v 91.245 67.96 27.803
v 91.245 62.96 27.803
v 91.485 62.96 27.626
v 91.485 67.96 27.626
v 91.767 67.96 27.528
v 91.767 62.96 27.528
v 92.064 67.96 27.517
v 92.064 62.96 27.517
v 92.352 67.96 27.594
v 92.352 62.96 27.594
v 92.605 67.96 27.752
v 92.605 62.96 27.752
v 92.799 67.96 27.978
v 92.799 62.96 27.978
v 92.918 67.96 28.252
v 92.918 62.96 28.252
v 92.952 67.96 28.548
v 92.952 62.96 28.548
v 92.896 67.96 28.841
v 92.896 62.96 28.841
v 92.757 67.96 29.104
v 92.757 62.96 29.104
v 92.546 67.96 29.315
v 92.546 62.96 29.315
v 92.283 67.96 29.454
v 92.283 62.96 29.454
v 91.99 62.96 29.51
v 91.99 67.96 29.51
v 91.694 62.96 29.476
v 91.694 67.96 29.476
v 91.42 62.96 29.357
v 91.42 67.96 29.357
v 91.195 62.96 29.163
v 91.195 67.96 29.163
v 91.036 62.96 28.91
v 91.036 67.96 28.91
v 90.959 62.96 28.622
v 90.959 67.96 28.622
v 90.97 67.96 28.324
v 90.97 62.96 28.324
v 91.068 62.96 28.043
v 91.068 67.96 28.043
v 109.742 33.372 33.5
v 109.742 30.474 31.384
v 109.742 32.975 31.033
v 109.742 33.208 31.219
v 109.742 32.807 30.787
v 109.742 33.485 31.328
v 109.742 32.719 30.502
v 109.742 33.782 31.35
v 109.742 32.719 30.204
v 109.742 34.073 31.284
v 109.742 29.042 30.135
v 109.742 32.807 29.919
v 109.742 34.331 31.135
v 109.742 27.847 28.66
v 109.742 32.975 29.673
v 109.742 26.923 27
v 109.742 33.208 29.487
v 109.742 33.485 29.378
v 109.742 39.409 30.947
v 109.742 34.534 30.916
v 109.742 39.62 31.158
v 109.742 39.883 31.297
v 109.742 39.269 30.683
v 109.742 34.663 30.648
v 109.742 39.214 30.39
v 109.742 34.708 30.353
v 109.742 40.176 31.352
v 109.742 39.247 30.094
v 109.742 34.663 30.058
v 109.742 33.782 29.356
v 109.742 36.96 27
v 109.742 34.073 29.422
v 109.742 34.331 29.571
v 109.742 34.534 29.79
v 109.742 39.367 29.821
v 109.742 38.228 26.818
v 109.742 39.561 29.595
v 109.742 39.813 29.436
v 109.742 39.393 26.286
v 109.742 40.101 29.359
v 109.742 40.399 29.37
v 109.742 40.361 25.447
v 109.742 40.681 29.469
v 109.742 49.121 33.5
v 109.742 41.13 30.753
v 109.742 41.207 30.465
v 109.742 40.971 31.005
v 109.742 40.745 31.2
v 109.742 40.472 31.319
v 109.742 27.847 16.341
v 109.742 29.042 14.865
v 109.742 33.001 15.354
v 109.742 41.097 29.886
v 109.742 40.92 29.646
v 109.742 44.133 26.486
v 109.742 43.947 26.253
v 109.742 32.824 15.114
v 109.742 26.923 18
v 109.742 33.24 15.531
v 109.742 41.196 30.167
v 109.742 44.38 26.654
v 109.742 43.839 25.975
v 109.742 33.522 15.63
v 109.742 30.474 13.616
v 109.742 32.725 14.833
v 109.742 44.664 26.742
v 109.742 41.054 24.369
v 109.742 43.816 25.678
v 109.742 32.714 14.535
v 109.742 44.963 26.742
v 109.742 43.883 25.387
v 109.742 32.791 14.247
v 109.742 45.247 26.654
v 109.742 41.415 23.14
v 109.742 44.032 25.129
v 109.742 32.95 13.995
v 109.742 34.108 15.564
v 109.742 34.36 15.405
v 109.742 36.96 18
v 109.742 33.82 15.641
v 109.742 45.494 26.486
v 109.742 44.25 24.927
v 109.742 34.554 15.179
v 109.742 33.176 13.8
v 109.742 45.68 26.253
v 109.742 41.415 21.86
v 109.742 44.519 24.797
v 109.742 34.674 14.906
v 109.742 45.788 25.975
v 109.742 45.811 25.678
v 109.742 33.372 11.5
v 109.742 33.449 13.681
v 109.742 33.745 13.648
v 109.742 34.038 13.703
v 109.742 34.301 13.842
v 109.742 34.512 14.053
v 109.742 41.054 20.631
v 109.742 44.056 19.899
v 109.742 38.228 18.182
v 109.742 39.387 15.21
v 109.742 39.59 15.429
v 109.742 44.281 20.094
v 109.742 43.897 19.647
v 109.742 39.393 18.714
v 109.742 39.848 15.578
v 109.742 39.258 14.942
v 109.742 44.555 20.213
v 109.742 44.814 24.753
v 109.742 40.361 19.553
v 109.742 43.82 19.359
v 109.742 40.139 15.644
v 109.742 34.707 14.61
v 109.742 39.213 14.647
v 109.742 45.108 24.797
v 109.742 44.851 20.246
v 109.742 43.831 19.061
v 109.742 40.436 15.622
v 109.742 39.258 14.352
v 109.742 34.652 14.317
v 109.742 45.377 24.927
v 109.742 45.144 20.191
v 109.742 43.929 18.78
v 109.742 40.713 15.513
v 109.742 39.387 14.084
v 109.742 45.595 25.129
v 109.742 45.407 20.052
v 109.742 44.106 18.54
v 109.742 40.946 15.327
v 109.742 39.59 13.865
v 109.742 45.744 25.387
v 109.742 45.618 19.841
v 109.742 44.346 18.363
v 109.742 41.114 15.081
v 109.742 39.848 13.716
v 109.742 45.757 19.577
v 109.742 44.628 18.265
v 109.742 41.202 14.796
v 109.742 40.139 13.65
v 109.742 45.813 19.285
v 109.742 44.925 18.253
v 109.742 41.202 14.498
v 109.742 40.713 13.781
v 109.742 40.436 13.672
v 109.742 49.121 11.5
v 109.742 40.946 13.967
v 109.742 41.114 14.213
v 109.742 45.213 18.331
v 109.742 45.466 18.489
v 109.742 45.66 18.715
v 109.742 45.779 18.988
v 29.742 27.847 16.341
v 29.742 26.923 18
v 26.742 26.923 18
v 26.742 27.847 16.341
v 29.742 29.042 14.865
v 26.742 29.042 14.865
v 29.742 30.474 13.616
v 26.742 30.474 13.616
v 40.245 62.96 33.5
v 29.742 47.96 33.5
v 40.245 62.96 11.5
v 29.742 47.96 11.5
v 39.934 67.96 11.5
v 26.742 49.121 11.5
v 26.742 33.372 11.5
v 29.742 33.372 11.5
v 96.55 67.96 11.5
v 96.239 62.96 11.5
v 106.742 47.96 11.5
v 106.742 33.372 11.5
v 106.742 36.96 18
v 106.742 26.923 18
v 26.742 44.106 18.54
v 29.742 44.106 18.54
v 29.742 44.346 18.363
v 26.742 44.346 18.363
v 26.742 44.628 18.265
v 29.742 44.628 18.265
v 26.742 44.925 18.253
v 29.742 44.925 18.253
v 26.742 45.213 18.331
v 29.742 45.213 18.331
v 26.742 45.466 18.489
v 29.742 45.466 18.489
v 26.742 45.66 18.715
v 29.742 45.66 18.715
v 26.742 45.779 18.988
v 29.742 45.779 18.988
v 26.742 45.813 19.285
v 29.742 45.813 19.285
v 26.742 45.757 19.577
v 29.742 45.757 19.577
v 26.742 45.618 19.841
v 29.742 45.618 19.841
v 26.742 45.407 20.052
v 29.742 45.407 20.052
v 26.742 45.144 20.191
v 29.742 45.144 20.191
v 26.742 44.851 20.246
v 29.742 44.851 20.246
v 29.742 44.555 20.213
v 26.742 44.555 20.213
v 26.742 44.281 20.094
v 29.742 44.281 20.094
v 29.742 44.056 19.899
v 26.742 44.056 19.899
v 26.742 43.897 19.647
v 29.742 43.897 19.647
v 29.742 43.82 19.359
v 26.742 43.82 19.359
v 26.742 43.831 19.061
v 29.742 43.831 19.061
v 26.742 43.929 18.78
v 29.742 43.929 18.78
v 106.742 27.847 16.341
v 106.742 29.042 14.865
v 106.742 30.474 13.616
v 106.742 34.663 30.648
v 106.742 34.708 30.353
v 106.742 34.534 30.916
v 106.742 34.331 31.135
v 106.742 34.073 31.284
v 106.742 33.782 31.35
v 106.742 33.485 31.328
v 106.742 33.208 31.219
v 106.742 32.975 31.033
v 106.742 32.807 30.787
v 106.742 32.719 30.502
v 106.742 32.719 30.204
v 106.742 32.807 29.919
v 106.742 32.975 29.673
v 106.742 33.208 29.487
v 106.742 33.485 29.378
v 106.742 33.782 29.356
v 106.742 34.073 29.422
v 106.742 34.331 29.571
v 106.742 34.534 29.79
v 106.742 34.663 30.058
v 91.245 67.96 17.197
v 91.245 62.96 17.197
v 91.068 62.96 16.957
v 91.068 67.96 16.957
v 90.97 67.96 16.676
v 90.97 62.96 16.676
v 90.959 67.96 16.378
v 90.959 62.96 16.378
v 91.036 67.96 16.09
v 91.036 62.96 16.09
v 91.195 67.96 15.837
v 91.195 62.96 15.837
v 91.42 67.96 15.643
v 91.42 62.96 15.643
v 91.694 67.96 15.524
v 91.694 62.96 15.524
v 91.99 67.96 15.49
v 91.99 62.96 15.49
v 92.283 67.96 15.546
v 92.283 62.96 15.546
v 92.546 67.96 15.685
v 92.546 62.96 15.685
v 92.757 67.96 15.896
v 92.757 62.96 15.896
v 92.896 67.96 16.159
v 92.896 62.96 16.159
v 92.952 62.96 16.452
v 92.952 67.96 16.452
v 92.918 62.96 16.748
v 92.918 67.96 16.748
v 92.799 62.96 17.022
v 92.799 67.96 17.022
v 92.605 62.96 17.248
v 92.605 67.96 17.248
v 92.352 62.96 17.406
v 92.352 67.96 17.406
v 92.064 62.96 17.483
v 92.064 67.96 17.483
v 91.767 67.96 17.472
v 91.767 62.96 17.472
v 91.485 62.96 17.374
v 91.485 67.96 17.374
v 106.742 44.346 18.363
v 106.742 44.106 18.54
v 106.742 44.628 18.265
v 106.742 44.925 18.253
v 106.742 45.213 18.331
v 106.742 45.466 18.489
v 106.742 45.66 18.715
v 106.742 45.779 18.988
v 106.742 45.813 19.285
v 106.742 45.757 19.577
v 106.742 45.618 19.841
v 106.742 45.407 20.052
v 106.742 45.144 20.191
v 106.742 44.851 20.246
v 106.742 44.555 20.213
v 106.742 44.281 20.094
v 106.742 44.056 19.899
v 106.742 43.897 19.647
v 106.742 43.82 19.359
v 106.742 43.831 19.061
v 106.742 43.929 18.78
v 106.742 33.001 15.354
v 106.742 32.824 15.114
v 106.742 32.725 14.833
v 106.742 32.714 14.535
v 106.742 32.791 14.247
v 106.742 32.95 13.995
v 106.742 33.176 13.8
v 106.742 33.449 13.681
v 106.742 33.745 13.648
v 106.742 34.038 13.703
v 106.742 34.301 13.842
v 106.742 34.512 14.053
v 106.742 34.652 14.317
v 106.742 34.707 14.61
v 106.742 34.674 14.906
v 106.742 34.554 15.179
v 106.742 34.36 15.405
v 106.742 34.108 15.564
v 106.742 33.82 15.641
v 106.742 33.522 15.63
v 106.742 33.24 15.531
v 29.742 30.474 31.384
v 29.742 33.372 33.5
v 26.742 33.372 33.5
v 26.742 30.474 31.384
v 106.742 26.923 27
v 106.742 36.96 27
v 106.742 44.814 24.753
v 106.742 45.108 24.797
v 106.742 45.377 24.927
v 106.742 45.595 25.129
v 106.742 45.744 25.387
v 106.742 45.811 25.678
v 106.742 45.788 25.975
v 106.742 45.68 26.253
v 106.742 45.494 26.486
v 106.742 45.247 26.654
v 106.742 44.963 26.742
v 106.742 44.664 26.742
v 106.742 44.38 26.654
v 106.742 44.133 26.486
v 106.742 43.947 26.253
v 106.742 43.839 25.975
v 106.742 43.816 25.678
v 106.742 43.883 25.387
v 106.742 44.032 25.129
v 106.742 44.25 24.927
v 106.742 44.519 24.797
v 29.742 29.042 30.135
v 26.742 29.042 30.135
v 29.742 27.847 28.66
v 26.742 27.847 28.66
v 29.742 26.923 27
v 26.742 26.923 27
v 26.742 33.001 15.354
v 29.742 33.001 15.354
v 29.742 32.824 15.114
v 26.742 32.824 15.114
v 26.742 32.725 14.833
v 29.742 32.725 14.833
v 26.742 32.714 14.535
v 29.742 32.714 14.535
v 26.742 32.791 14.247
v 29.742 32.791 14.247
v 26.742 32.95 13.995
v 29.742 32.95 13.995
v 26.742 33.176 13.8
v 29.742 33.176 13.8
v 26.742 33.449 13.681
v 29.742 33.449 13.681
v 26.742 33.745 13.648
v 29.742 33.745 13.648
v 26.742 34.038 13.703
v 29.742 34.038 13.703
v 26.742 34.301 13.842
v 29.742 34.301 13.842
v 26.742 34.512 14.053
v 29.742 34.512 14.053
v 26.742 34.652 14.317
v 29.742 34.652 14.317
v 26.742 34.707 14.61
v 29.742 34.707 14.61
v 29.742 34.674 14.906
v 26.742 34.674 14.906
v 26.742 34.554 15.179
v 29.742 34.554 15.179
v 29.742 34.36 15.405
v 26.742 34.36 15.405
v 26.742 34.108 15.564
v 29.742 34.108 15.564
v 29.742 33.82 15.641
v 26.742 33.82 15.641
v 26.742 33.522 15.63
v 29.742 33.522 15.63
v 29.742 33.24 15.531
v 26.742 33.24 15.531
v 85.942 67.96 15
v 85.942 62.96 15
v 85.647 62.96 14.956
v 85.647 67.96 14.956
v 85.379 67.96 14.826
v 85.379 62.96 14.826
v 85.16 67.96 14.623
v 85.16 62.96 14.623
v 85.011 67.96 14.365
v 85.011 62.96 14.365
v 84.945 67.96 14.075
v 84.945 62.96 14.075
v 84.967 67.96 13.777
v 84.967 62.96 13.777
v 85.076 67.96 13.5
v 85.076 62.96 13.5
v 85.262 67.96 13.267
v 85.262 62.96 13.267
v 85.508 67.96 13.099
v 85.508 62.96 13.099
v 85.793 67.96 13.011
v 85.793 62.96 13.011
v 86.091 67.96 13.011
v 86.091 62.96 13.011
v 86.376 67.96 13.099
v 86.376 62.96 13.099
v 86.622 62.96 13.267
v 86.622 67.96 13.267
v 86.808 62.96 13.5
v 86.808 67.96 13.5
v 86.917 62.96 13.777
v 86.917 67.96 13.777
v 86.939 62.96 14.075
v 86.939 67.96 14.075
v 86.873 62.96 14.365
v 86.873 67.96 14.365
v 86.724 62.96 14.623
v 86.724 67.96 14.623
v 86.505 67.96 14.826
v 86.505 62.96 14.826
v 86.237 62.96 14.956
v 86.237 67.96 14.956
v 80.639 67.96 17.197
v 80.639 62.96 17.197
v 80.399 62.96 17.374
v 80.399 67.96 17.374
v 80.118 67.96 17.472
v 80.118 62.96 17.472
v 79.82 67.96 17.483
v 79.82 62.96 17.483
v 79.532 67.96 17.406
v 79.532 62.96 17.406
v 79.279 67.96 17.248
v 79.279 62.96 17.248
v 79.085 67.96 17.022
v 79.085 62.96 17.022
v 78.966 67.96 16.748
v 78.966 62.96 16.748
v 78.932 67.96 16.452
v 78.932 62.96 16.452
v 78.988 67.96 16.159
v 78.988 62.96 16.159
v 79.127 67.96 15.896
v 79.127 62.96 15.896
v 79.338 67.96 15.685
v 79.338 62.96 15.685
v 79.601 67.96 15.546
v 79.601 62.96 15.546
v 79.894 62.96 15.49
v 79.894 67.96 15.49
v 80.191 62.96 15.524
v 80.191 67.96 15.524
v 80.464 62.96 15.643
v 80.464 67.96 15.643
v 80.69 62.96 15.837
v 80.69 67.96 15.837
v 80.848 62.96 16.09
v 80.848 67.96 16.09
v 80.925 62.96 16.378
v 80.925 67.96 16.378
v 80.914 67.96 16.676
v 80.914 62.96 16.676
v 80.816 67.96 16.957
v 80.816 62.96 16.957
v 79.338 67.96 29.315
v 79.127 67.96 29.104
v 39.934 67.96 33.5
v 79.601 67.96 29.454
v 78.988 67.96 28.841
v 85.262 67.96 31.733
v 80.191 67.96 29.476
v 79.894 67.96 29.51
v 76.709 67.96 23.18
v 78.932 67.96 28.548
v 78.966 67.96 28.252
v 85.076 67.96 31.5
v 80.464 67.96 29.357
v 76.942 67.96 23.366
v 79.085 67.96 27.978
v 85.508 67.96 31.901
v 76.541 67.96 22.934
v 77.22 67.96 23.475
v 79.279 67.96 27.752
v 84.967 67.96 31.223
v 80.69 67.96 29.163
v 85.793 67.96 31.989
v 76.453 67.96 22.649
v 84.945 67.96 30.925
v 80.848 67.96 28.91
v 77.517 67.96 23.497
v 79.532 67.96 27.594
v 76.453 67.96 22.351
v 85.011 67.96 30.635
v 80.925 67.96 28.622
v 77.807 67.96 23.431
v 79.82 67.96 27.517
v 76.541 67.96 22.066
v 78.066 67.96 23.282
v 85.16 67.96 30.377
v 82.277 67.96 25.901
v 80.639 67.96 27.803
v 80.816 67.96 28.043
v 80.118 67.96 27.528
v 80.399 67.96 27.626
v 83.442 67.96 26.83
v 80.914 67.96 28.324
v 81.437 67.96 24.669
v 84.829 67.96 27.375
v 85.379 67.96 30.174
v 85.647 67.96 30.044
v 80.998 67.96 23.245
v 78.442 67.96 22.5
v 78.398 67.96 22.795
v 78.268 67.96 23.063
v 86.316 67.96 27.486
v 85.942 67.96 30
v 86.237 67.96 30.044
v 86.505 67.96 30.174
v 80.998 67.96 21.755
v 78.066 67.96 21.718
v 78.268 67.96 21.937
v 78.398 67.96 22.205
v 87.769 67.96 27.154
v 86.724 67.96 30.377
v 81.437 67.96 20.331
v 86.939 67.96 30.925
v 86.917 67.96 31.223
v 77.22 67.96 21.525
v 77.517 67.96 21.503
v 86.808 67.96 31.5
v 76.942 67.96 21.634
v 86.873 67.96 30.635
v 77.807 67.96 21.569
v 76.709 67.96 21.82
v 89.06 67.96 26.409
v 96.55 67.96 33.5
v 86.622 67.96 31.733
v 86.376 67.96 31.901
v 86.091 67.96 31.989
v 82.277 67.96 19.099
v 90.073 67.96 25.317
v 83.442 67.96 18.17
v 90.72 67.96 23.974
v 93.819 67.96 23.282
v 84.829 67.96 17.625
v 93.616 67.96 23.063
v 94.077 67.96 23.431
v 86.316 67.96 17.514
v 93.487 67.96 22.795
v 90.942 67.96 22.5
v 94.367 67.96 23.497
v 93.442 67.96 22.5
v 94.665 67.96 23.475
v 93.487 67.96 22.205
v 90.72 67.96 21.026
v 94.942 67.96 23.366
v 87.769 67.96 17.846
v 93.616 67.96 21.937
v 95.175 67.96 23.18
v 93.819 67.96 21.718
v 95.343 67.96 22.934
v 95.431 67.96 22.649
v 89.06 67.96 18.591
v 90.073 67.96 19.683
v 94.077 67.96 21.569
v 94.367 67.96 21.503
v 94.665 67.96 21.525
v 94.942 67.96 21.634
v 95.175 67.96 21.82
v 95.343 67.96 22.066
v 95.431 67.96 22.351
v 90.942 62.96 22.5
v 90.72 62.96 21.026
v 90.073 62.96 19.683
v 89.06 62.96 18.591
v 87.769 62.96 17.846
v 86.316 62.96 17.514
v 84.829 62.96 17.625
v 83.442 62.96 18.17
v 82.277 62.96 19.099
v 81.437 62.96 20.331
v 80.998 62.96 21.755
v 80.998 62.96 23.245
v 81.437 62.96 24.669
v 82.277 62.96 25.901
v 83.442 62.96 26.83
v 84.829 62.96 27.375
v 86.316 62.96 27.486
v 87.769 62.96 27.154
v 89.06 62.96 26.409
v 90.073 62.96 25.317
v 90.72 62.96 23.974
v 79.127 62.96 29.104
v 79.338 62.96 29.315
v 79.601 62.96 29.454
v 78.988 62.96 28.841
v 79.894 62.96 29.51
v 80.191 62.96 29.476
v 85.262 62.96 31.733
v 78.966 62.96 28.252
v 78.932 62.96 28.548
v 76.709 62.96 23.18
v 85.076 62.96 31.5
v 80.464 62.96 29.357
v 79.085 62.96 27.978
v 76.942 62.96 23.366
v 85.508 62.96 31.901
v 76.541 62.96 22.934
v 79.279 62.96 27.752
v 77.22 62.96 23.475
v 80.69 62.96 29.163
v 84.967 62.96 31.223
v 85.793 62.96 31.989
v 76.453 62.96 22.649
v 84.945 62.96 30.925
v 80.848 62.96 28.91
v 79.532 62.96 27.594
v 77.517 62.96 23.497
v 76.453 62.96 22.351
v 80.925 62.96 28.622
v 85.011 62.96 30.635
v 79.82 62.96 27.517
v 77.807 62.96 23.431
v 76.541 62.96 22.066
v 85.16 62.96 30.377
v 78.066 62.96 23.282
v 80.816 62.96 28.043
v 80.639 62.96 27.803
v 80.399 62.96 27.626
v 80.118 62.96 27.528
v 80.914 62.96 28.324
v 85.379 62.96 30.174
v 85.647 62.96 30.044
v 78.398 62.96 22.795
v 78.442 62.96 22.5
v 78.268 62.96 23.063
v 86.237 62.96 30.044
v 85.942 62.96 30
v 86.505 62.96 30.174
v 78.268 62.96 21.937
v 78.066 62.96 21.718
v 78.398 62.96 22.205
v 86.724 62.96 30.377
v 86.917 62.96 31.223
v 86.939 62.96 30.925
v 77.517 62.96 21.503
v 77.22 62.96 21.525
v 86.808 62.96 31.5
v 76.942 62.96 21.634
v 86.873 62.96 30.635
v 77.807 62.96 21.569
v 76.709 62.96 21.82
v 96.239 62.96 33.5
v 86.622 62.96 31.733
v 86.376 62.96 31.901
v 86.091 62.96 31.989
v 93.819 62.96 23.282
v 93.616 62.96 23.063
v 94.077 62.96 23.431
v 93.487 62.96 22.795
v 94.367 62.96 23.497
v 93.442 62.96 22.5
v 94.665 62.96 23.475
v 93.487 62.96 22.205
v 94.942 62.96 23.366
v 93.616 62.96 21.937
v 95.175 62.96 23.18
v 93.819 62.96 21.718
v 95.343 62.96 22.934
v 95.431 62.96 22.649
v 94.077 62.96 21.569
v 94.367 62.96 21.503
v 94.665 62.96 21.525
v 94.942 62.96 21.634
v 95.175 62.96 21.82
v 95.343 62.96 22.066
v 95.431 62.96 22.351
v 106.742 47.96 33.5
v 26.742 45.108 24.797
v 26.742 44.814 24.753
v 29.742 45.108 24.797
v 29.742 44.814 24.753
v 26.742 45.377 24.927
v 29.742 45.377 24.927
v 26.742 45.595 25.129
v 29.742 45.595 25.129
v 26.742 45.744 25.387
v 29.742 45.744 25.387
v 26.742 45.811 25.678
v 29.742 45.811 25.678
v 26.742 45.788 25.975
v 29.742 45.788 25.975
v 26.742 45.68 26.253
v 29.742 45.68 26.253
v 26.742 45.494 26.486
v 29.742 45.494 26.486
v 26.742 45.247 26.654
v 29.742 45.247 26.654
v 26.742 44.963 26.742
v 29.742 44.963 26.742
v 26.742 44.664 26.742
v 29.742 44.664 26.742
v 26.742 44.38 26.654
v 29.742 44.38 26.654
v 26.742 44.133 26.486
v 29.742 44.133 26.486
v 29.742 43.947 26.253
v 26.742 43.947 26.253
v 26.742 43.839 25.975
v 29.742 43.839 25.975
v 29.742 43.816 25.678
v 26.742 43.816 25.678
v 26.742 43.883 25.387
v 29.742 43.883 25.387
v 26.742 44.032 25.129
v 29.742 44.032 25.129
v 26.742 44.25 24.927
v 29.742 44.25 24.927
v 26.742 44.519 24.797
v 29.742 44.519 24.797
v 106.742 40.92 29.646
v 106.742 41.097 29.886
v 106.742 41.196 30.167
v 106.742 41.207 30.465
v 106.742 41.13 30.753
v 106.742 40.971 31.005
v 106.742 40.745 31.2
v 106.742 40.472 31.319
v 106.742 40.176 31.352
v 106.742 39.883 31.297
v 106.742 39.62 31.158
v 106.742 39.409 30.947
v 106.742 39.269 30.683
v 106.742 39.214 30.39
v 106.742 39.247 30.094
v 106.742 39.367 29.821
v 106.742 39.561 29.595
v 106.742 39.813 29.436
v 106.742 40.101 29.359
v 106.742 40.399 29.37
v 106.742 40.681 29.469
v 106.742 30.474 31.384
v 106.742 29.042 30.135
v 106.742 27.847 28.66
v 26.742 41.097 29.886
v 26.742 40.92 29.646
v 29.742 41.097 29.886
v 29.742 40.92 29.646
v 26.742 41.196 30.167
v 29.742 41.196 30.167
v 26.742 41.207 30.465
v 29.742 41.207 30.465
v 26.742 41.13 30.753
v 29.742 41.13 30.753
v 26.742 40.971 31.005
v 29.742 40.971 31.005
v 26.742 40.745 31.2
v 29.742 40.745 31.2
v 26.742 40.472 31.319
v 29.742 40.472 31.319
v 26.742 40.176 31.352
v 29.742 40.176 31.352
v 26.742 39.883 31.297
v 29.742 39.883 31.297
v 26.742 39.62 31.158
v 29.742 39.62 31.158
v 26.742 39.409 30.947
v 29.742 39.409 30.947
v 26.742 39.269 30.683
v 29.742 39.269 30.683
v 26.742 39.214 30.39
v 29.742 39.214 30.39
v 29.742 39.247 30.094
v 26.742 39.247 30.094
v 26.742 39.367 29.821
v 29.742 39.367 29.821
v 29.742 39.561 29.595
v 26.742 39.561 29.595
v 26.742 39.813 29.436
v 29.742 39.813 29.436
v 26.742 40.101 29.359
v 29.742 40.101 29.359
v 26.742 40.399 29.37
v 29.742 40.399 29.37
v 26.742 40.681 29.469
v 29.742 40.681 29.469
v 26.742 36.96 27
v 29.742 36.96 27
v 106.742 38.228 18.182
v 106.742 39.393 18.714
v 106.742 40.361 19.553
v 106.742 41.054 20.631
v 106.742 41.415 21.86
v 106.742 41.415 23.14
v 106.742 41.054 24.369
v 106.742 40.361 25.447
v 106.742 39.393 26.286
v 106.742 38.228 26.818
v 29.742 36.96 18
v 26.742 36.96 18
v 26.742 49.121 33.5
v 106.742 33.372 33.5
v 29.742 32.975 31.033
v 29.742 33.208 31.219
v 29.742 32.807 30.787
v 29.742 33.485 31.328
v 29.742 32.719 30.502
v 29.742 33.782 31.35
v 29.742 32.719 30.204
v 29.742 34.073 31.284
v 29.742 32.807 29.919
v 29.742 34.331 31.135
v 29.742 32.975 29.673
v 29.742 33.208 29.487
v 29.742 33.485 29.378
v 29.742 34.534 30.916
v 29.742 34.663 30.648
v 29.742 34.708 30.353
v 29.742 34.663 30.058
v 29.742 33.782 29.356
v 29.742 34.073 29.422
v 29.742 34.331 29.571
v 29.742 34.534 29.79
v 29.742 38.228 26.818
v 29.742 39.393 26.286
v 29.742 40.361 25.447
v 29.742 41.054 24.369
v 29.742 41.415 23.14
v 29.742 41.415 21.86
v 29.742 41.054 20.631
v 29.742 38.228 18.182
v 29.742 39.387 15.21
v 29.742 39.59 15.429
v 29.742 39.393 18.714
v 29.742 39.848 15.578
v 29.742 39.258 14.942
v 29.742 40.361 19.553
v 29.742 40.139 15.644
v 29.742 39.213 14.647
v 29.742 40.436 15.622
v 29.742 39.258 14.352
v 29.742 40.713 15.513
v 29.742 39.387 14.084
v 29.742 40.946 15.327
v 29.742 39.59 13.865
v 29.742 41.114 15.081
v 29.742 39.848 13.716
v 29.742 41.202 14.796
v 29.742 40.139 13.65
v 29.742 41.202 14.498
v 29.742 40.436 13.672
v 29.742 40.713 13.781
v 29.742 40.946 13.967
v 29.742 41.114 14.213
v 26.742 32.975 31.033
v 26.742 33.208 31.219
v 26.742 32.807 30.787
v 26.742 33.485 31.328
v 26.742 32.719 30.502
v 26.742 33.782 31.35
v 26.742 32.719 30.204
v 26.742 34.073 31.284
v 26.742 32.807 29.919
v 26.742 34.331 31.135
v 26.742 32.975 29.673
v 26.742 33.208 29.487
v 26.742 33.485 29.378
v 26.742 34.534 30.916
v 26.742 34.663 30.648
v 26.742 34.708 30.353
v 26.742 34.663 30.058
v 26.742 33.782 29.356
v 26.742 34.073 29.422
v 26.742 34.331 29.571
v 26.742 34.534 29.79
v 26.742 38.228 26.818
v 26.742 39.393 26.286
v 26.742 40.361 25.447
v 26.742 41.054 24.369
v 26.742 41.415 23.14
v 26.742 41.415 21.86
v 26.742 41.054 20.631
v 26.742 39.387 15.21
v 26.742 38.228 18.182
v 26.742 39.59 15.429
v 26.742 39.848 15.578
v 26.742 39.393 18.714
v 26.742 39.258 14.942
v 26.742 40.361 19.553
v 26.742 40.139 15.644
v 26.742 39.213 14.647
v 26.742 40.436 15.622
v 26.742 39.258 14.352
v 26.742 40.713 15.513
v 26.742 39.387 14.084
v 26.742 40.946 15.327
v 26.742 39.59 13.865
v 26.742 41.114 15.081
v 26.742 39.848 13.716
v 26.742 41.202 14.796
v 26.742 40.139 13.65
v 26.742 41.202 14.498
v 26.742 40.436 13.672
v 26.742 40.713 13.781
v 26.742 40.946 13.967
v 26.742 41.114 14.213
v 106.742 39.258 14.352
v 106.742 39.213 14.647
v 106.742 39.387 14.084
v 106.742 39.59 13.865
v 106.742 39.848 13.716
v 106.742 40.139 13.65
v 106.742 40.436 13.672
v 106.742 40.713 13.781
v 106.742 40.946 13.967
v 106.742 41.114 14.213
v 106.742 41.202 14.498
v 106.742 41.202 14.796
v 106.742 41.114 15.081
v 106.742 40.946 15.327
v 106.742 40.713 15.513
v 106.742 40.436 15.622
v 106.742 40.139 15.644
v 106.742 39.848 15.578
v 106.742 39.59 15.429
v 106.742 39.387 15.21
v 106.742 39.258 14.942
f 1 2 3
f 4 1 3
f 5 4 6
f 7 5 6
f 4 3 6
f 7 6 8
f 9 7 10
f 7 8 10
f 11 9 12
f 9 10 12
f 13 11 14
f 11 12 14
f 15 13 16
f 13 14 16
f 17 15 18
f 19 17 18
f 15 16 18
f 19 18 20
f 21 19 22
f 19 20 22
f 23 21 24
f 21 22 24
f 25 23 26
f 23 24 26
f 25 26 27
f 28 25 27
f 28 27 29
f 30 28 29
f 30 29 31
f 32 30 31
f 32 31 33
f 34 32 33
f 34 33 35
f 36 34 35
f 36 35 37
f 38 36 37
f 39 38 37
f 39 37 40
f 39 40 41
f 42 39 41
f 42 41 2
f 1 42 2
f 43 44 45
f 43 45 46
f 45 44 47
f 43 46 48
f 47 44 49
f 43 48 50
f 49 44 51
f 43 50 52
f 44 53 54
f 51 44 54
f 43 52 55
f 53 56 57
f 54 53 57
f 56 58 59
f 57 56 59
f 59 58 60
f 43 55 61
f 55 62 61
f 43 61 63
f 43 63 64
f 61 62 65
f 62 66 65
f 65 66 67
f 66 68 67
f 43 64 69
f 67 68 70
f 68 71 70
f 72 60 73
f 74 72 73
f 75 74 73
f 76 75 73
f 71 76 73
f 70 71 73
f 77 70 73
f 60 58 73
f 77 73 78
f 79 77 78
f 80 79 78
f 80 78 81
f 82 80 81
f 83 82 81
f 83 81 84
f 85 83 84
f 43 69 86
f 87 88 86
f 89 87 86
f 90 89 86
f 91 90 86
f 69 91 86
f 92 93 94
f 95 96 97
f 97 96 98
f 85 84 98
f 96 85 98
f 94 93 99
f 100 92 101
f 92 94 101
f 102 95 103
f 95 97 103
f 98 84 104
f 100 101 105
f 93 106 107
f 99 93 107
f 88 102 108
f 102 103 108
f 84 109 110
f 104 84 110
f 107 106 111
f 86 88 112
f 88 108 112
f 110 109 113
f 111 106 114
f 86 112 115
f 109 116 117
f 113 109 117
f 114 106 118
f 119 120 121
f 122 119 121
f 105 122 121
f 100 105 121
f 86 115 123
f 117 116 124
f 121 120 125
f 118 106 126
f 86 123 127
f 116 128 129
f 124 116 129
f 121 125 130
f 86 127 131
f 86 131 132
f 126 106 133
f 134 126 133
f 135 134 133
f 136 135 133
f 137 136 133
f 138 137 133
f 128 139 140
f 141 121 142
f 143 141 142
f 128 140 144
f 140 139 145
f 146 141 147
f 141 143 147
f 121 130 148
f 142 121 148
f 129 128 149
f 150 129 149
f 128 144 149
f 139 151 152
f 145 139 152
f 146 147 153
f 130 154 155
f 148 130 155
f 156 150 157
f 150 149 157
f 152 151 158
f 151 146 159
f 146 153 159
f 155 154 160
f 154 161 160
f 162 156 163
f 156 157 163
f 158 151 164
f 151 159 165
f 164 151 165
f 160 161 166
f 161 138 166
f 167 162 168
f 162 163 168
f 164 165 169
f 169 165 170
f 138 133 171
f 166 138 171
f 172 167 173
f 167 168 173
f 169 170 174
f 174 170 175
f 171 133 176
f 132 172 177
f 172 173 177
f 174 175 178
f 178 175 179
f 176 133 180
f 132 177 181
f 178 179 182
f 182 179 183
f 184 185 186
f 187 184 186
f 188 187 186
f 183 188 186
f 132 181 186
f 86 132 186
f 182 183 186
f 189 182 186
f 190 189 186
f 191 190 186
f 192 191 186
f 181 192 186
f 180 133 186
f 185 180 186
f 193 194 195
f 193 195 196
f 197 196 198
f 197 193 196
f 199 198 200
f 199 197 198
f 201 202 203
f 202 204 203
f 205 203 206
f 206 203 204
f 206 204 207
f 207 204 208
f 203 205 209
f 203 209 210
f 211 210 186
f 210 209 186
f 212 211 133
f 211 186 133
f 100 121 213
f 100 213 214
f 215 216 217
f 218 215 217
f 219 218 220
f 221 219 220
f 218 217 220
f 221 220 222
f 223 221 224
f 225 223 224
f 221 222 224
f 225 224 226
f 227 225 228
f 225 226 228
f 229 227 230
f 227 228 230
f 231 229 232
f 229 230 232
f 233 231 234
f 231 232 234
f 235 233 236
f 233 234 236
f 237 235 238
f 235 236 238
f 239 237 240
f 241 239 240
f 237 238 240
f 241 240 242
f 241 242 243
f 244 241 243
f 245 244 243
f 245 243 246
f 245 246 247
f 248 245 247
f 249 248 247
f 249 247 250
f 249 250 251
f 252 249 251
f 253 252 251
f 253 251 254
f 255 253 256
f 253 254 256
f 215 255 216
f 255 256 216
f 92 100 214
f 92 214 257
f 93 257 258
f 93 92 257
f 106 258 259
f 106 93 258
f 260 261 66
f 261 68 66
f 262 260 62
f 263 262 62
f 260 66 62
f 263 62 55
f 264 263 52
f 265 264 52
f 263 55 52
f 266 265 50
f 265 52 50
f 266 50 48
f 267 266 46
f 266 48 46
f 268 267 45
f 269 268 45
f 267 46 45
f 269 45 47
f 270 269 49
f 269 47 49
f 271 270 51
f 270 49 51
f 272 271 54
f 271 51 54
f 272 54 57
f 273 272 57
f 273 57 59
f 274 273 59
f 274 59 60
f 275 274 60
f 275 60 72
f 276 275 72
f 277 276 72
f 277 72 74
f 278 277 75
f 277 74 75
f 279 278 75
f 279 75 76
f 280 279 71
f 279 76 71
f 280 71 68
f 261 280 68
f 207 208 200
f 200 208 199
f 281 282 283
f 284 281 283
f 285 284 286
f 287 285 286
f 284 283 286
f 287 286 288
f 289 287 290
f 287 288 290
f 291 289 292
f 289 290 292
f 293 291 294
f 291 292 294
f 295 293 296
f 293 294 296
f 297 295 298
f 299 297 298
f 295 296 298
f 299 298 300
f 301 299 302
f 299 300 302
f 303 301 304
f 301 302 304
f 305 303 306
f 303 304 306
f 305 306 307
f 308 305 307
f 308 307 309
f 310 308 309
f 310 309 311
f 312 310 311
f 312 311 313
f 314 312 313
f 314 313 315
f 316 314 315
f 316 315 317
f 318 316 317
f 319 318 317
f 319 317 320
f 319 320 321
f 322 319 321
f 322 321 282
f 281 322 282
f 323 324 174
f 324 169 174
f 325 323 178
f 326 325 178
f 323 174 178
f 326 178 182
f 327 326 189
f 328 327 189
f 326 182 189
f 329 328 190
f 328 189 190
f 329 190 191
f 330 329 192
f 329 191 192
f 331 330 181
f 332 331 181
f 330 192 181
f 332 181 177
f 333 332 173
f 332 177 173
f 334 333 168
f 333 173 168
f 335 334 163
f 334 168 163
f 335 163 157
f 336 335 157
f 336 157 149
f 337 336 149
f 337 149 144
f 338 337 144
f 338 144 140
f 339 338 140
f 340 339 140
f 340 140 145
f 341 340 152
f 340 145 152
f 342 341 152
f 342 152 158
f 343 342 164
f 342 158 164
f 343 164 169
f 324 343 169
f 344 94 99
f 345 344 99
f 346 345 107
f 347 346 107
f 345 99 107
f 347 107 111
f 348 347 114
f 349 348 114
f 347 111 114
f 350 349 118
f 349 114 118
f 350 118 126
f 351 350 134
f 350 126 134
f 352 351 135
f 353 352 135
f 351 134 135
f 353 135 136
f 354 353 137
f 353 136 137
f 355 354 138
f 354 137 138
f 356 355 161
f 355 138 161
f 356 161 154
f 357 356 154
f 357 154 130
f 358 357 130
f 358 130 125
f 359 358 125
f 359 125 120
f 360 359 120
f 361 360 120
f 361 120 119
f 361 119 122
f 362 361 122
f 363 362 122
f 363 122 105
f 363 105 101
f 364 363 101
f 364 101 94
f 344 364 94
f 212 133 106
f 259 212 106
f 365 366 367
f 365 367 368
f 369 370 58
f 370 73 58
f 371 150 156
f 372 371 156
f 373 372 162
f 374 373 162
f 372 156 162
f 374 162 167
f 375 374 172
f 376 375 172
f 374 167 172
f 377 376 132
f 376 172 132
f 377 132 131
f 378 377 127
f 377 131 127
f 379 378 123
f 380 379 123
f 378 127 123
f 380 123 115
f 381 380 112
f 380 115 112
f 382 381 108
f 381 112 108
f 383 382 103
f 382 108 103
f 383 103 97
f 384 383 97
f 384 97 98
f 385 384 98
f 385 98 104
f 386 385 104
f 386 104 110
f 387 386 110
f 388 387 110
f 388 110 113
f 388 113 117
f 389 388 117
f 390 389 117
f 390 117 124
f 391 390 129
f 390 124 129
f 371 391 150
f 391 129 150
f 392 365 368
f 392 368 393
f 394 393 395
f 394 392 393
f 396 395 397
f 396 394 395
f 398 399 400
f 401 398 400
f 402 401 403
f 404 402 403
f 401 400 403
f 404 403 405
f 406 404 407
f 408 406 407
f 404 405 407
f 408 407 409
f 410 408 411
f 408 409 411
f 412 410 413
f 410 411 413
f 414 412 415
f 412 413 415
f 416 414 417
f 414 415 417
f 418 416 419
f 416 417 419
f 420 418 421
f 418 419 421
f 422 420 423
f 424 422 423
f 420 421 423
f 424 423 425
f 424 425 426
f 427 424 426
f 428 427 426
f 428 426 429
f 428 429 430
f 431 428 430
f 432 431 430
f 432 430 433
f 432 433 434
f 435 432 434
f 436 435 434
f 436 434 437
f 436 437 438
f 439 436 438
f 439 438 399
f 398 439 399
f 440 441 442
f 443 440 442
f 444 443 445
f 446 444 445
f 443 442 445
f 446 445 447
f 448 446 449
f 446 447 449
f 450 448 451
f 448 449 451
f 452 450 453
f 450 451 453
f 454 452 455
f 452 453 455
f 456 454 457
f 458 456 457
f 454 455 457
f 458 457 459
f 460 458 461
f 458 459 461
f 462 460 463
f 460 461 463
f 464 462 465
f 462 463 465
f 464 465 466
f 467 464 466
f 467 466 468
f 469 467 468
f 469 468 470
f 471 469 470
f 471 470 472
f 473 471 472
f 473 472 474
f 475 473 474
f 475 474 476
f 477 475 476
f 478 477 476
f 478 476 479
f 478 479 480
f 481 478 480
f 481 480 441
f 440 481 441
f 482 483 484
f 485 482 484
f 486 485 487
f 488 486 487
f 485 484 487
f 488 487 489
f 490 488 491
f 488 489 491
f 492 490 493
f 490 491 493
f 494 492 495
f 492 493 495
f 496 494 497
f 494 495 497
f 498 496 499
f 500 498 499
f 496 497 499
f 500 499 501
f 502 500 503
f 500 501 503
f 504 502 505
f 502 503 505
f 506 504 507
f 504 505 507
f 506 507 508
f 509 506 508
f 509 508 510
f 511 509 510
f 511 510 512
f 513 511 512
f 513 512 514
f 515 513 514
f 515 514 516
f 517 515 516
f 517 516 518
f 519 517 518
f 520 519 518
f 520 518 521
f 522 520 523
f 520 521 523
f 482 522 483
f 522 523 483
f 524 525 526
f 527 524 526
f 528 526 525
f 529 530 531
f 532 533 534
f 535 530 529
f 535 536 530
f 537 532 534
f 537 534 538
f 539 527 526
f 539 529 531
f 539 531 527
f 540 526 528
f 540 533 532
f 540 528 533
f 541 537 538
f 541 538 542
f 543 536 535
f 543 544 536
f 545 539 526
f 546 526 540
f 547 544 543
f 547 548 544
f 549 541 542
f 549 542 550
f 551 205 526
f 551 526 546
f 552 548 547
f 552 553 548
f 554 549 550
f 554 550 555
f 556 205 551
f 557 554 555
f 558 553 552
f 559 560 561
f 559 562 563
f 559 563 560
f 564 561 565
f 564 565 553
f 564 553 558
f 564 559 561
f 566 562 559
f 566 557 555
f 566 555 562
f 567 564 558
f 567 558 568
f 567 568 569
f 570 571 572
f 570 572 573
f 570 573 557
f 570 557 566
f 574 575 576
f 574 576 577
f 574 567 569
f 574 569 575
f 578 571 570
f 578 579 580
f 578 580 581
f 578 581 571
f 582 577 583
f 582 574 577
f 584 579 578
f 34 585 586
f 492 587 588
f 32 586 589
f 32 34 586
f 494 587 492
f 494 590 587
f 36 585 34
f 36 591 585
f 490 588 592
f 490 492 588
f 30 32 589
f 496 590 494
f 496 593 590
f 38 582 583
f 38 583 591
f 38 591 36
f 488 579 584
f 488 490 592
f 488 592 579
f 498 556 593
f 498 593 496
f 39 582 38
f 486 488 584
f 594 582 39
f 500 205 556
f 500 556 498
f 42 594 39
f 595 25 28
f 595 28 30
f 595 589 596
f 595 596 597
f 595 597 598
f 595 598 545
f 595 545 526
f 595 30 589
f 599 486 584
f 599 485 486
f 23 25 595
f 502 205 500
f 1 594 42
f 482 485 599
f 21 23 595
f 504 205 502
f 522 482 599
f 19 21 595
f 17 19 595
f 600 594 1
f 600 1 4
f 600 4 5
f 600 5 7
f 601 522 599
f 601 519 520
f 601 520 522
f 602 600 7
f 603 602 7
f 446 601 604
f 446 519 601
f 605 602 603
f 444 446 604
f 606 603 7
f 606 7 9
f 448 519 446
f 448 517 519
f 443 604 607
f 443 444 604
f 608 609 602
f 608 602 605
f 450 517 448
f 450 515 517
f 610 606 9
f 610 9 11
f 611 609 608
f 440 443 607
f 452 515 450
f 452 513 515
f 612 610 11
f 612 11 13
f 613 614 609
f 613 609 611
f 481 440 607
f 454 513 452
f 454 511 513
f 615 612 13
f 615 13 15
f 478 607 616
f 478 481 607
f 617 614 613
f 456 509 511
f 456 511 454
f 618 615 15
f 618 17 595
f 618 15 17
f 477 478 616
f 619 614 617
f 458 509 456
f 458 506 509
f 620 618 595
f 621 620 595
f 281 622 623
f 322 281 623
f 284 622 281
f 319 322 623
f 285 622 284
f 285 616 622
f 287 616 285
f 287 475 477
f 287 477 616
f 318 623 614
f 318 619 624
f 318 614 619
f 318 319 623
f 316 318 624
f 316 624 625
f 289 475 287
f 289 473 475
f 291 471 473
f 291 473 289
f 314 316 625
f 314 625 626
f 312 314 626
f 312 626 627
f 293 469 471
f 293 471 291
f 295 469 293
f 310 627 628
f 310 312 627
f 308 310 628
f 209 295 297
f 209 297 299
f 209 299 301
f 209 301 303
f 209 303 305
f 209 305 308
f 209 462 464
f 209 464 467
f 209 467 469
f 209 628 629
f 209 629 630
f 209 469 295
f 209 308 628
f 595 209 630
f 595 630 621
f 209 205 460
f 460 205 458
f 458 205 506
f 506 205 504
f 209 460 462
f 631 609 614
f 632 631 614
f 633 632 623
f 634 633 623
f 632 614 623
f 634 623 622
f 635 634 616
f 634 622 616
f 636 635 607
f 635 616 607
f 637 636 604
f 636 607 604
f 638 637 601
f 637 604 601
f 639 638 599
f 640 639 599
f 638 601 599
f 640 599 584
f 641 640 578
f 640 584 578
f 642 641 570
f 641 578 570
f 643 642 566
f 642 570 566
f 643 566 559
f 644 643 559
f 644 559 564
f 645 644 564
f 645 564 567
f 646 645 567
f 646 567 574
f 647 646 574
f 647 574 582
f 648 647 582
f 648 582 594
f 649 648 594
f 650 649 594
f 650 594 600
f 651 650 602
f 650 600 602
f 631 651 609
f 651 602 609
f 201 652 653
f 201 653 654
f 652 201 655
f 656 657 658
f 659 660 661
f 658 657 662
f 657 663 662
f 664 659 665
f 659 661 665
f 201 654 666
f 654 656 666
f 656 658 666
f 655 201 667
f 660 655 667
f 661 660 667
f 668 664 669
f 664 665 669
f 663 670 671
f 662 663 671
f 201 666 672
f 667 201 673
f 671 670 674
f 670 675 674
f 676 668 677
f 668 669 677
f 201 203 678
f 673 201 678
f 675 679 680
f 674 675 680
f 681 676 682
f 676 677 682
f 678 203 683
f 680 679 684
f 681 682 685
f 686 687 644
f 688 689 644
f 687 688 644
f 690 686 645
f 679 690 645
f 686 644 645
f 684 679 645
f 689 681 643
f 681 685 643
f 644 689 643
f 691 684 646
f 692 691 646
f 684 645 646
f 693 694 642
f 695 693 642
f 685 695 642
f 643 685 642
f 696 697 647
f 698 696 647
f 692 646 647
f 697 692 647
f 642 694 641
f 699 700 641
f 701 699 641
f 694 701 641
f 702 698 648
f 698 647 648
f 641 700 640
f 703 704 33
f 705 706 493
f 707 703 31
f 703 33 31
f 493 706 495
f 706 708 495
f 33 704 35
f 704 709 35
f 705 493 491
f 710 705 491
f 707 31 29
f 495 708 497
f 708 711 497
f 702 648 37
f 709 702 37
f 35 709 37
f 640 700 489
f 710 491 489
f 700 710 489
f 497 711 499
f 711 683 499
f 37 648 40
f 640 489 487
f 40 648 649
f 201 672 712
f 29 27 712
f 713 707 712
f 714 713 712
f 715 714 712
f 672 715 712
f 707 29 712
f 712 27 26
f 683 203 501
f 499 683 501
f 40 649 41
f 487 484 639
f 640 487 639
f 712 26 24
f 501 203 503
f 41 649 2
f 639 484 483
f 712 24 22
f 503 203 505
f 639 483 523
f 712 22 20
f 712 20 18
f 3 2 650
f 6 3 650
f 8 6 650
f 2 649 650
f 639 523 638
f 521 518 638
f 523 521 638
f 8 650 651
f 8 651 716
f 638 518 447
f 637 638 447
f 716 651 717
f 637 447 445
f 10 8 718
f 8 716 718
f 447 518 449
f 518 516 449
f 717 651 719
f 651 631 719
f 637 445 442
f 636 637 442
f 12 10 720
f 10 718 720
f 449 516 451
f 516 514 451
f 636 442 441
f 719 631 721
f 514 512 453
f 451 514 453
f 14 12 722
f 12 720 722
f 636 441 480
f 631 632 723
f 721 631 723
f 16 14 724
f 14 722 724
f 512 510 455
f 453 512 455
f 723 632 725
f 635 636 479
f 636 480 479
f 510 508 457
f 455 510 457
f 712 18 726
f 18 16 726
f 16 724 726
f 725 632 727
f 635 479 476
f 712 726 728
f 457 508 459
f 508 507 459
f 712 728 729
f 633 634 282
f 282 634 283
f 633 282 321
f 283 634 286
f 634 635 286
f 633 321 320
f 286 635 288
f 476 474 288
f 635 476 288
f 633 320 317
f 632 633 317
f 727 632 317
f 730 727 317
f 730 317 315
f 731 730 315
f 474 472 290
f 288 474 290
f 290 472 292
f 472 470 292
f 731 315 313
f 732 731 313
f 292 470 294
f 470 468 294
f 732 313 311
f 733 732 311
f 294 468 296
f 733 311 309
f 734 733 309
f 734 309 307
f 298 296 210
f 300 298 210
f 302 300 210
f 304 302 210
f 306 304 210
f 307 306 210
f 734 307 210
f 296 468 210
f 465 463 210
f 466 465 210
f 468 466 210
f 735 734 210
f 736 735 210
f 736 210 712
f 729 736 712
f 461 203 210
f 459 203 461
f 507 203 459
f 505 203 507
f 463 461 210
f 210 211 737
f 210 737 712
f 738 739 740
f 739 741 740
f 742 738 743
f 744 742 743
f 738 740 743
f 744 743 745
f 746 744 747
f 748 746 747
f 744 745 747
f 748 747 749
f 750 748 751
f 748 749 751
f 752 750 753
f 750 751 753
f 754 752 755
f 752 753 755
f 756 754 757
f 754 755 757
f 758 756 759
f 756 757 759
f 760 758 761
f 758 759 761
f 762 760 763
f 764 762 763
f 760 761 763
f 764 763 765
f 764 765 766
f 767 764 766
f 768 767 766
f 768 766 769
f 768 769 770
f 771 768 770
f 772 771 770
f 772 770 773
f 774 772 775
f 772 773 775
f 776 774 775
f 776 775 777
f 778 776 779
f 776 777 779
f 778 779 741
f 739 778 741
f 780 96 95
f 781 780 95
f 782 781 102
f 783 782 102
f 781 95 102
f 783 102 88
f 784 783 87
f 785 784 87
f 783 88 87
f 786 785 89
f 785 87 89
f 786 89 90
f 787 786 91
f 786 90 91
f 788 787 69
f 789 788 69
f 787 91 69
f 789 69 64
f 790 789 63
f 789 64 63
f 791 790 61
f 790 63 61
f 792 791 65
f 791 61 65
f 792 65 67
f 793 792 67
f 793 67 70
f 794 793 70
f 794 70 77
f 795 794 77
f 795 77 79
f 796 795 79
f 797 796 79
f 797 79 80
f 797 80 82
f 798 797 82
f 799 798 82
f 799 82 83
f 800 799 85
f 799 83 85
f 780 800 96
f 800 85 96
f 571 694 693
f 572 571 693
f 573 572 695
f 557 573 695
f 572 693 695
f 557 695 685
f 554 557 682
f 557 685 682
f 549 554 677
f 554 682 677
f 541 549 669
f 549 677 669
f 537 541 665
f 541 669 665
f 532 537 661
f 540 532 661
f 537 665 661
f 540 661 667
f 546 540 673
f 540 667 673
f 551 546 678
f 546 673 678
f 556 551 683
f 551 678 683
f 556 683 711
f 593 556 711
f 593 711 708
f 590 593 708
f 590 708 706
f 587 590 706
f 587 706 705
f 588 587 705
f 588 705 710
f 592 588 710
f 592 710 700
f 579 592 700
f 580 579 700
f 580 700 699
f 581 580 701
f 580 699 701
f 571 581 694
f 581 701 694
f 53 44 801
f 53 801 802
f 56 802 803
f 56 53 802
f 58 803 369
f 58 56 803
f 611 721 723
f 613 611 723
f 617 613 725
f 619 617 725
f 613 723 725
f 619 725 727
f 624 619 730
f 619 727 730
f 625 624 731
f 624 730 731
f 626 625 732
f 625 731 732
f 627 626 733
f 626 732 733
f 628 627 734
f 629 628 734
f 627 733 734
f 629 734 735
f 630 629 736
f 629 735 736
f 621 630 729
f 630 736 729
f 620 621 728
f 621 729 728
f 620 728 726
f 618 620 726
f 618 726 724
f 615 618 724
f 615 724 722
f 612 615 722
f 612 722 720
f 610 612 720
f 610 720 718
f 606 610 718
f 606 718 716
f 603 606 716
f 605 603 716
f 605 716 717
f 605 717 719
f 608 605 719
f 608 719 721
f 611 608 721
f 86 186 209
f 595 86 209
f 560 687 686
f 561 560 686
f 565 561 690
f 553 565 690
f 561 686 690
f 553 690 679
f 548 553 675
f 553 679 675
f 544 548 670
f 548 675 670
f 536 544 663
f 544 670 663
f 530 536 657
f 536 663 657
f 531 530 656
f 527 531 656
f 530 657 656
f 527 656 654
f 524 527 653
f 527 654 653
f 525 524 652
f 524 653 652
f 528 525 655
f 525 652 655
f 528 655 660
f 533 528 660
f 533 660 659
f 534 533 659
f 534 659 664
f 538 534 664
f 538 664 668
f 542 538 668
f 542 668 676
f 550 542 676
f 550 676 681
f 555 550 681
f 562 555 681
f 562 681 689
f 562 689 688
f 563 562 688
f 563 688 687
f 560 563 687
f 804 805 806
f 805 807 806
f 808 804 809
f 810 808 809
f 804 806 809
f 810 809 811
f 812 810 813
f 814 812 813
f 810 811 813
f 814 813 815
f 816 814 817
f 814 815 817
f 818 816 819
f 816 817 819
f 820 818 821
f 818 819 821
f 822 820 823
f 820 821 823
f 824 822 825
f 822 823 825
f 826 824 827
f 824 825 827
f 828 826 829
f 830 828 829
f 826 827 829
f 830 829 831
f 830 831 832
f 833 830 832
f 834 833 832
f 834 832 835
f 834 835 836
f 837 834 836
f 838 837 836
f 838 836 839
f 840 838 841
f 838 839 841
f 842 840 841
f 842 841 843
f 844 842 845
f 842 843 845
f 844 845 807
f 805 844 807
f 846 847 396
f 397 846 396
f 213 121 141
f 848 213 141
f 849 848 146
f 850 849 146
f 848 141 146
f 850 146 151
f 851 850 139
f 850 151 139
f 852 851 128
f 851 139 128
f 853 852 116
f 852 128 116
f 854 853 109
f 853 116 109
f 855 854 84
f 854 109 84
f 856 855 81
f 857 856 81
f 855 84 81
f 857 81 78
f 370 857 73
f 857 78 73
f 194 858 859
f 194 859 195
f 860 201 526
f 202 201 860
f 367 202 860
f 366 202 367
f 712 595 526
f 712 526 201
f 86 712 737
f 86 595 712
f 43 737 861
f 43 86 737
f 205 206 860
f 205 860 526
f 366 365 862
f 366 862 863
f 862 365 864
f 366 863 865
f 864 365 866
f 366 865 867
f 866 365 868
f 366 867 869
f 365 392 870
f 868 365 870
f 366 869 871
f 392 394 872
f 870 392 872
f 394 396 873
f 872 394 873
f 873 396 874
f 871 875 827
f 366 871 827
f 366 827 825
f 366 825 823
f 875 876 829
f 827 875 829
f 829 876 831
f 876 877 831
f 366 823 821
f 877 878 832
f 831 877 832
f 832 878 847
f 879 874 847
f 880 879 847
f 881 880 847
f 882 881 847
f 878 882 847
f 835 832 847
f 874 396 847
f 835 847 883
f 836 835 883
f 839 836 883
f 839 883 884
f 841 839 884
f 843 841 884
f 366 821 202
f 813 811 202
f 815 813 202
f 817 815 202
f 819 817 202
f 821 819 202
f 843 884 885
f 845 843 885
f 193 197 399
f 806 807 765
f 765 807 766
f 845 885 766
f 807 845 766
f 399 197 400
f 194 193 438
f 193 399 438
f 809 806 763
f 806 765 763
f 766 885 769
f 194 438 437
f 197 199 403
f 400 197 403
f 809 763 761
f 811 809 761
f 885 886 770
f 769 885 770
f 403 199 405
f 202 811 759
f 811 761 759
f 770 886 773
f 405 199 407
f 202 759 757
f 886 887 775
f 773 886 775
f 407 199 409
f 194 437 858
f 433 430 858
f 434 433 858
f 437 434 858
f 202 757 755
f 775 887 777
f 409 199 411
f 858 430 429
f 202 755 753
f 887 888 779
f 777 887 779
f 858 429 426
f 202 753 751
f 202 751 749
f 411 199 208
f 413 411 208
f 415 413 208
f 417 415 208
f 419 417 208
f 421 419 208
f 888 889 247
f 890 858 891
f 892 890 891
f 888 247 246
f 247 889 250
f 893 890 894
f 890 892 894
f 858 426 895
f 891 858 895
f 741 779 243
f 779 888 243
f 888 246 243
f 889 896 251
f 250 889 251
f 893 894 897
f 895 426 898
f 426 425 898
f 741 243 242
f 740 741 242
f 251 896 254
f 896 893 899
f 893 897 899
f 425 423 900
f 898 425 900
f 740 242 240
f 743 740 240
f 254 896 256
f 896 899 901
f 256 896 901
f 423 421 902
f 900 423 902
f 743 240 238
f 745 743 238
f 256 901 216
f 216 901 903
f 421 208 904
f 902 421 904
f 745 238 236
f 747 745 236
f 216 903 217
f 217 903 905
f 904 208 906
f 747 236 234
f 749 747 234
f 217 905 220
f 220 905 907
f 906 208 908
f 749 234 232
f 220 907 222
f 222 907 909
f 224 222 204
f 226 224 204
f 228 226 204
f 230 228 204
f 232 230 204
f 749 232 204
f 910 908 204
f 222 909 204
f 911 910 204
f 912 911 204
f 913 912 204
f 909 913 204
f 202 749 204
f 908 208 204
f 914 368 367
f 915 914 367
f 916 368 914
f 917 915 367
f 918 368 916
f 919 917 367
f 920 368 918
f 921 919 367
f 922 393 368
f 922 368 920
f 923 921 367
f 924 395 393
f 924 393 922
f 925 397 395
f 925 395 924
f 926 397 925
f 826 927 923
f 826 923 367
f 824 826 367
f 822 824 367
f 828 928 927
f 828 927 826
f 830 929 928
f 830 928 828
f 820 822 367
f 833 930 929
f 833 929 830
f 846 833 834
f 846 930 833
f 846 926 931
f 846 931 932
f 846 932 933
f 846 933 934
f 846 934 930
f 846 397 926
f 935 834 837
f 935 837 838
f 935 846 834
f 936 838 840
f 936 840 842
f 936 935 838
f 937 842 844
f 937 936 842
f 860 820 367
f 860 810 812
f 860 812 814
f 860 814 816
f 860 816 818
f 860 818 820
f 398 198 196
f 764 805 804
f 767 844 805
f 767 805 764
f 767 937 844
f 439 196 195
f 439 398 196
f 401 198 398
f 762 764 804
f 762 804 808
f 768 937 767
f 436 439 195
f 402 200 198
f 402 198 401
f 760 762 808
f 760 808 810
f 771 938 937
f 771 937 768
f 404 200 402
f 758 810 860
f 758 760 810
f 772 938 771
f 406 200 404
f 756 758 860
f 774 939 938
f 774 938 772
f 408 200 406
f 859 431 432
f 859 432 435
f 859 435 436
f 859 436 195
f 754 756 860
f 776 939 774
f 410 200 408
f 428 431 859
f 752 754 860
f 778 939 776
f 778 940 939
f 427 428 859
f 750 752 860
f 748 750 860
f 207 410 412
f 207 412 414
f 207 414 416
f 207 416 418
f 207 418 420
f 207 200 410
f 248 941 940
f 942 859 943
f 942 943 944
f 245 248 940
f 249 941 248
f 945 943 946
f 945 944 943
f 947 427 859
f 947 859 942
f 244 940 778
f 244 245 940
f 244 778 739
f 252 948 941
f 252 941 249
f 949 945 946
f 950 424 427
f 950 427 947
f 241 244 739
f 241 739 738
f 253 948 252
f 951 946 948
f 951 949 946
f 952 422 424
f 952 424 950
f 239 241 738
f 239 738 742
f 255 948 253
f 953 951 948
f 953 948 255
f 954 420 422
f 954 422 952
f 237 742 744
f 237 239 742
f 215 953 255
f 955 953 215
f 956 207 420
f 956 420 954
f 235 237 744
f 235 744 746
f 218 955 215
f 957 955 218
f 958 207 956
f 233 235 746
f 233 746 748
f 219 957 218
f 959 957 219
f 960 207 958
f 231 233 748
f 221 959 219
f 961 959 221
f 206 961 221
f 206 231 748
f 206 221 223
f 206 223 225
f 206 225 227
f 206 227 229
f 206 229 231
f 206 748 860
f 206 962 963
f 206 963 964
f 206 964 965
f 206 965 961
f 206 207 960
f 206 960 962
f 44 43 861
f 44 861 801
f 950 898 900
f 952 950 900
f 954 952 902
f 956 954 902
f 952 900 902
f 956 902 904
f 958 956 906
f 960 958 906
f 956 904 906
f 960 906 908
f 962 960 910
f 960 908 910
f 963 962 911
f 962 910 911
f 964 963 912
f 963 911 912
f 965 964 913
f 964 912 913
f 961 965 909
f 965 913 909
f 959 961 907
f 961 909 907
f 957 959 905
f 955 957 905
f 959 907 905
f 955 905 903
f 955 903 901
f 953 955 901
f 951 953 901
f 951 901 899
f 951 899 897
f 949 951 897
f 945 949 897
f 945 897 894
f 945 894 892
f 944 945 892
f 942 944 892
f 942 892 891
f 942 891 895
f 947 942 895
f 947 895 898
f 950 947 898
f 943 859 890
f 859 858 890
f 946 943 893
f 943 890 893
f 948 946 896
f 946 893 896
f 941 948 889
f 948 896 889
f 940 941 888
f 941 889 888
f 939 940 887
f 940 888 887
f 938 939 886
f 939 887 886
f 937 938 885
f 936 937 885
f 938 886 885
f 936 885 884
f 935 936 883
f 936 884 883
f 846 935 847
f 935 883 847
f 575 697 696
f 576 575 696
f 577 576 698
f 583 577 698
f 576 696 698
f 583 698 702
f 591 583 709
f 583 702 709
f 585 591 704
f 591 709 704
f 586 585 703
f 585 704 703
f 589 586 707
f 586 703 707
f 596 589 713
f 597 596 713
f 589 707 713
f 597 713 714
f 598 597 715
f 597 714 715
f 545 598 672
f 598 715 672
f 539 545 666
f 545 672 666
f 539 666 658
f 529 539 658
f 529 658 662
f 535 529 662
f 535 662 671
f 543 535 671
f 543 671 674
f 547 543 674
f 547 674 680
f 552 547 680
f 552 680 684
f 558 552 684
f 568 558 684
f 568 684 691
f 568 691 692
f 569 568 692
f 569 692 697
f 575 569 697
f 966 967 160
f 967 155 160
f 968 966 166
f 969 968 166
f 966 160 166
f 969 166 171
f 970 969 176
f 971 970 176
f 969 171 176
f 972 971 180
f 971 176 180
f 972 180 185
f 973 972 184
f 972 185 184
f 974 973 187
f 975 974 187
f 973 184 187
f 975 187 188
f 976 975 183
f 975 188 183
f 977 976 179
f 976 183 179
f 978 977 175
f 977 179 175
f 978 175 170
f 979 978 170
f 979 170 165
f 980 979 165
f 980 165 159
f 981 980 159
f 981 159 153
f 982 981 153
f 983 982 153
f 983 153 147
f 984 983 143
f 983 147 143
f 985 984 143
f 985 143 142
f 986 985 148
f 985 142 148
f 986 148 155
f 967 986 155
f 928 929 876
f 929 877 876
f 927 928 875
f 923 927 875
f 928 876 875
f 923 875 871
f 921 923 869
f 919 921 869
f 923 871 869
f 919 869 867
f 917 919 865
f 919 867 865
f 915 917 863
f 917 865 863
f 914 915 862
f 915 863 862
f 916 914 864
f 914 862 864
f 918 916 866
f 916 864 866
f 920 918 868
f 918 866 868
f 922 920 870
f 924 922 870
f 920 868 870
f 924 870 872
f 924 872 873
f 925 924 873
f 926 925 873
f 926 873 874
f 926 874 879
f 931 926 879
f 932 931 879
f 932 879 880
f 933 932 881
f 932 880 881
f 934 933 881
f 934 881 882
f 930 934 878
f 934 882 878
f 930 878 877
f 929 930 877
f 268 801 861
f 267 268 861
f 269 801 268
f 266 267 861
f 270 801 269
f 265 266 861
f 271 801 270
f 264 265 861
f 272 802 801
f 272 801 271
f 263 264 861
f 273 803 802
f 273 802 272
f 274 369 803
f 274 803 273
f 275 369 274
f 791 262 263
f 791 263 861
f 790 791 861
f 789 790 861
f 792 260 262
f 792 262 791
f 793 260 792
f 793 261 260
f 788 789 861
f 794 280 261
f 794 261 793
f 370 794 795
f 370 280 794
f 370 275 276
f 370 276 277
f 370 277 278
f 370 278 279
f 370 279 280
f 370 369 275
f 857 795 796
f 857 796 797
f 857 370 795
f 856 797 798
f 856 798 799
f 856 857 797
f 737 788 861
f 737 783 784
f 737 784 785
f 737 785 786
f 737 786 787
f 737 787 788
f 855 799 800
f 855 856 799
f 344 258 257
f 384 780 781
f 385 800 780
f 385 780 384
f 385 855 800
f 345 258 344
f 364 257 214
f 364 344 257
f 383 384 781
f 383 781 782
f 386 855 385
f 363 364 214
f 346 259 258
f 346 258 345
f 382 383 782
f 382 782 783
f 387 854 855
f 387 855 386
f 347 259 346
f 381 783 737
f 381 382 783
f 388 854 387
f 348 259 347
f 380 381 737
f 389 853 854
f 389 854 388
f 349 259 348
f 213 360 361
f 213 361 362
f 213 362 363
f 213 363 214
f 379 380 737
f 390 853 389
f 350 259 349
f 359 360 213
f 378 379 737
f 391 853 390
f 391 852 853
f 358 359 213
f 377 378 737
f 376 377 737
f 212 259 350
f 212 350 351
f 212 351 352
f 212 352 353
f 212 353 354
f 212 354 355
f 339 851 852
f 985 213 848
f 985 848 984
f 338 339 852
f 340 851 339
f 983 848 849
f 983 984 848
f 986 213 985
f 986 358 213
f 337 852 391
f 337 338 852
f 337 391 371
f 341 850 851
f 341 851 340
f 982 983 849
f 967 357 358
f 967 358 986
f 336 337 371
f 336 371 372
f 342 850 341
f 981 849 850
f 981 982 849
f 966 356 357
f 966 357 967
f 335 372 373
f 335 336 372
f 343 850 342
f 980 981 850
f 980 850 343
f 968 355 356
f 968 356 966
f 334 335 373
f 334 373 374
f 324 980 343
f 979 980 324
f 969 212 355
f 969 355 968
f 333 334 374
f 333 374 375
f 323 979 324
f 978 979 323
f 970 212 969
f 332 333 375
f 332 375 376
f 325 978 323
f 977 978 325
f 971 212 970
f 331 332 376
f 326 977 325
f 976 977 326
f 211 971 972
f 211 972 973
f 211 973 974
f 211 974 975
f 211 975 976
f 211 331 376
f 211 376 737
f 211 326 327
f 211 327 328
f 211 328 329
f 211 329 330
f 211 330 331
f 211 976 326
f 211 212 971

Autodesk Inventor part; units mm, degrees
ref_plane "YZ Plane" through (0, 0, 0) normal (1, 0, 0) x (0, 1, 0)
ref_plane "XZ Plane" through (0, 0, 0) normal (0, 1, 0) x (-1, 0, 0)
ref_plane "XY Plane" through (0, 0, 0) normal (0, 0, 1) x (1, 0, 0)
sketch "Sketch1" plane through (0, 0, 0) normal (0, 0, 1) x (1, 0, 0)
  line L0 (26.7421, 25.9605) -> (26.7421, 49.1206)
  line L1 (40.2452, 62.9605) -> (96.239, 62.9605)
  line L2 (39.9339, 67.9605) -> (96.5503, 67.9605)
  line L3 (106.7421, 25.9605) -> (106.7421, 47.9605)
  line L4 (26.7421, 25.9605) -> (29.7421, 25.9605)
  line L5 (106.7421, 25.9605) -> (109.7421, 25.9605)
  line L6 (109.7421, 25.9605) -> (109.7421, 49.1206)
  line L7 (29.7421, 25.9605) -> (29.7421, 47.9605)
  line L8 (29.7421, 47.9605) -> (40.2452, 62.9605)
  line L9 (26.7421, 49.1206) -> (39.9339, 67.9605)
  line L10 (106.7421, 47.9605) -> (96.239, 62.9605)
  line L11 (109.7421, 49.1206) -> (96.5503, 67.9605)
  point P0 (0, 0)
extrude "Extrusion1" add sketch "Sketch1" along normal blind 45
sketch "Sketch2" plane through (109.7421, 25.9605, 0) normal (1, 0, 0) x (0, 0, -1)
  line L0 (-45, 23.1601) -> (-45, 0) projected
  line L1 (0, 0) -> (-45, 0) projected
  line L2 (0, 23.1601) -> (0, 0) projected
  line L3 (0, 23.1601) -> (-45, 23.1601) projected
  line L4 (-45, 23.1601) -> (-31.3837, 4.513)
  line L5 (0, 23.1601) -> (-13.6163, 4.513)
  arc A0 (-18, 11) -> (-27, 11) centre (-22.5, 11) ccw
  line L6 (-45, 23.1601) -> (-45, -1.8399)
  line L7 (-45, -1.8399) -> (0, -1.8399)
  line L8 (0, -1.8399) -> (0, 23.1601)
  line L9 (-18, 11) -> (-18, 0.9626)
  line L10 (-27, 11) -> (-27, 0.9626)
  arc A1 (-18, 0.9626) -> (-13.6163, 4.513) centre (-22.5, 11) ccw
  arc A2 (-31.3837, 4.513) -> (-27, 0.9626) centre (-22.5, 11) ccw
  line L11 (-45, 42) -> (-33.5, 42)
  line L12 (-33.5, 42) -> (-33.5, 2)
  line L13 (-33.5, 2) -> (-45, 2)
  line L14 (-45, 2) -> (-45, 42)
  line L15 (0, 42) -> (-11.5, 42)
  line L16 (-11.5, 42) -> (-11.5, 2)
  line L17 (-11.5, 2) -> (0, 2)
  line L18 (0, 2) -> (0, 42)
  circle A3 centre (-22.5, 11) radius 11
  point P0 (0, -25.9605)
  dimension "d3" = 11
  dimension "d4" = 9
  dimension "d5" = 25
  dimension "d14" = 11.5
  dimension "d15" = 11.5
  dimension "d16" = 40
  dimension "d17" = 40
sketch "Sketch3" plane through (39.9339, 67.9605, 0) normal (0, 1, 0) x (1, 0, 0)
  circle A0 centre (46.0082, -22.5) radius 5
  line L0 (69.8082, 0) -> (69.8082, -45) projected
  point P0 (-39.9339, 0)
  dimension "d8" = 10
  dimension "d9" = 23.8
extrude "Extrusion3" cut sketch "Sketch3" against normal blind 45
extrude "Extrusion4" cut sketch "Sketch2" against normal through all contours L4 L12 L13 L0 | L14 L11 L12 L3 | L3 L12 L4 | L13 L12 L4 A2 A3 L1 L0 | L16 L15 L18 L3 | L3 L5 L16 | A3 A1 L5 L16 L17 L2 L1 | A3 L10 A0 L9 | L2 L17 L16 L5
sketch "Sketch4" plane through (109.7421, 33.3718, 33.5) normal (1, 0, 0) x (0, 0, -1)
  arc A0 (15.5, -6.4487) -> (19.8837, -2.8983) centre (11, 3.5887) ccw projected
  line L0 (11, 3.5887) -> (19.5, 3.5887) construction
  circle A1 centre (7.7472, 11.4417) radius 1
  point P0 (33.5, -33.3718)
  dimension "d22" = 2
extrude "Extrusion5" cut sketch "Sketch4" against normal through all
pattern_circular "Circular Pattern1" count 8 over 360 about axis through (109.7421, 36.9605, 22.5) along (-1, 0, 0) of "Extrusion5"
sketch "Sketch5" plane through (40.2452, 62.9605, 11.5) normal (0, -1, 0) x (1, 0, 0)
  circle A0 centre (45.6969, 11) radius 5 projected
  circle A1 centre (37.1969, 11) radius 1
  point P0 (-40.2452, -11.5)
  dimension "d28" = 2
  dimension "d29" = 8.5
extrude "Extrusion6" cut sketch "Sketch5" against normal through all contours A1
pattern_circular "Circular Pattern2" count 8 over 360 about axis through (85.9421, 67.9605, 22.5) along (0, -1, 0) of "Extrusion6"
properties part number "Hips" material "Aluminum-6061"
